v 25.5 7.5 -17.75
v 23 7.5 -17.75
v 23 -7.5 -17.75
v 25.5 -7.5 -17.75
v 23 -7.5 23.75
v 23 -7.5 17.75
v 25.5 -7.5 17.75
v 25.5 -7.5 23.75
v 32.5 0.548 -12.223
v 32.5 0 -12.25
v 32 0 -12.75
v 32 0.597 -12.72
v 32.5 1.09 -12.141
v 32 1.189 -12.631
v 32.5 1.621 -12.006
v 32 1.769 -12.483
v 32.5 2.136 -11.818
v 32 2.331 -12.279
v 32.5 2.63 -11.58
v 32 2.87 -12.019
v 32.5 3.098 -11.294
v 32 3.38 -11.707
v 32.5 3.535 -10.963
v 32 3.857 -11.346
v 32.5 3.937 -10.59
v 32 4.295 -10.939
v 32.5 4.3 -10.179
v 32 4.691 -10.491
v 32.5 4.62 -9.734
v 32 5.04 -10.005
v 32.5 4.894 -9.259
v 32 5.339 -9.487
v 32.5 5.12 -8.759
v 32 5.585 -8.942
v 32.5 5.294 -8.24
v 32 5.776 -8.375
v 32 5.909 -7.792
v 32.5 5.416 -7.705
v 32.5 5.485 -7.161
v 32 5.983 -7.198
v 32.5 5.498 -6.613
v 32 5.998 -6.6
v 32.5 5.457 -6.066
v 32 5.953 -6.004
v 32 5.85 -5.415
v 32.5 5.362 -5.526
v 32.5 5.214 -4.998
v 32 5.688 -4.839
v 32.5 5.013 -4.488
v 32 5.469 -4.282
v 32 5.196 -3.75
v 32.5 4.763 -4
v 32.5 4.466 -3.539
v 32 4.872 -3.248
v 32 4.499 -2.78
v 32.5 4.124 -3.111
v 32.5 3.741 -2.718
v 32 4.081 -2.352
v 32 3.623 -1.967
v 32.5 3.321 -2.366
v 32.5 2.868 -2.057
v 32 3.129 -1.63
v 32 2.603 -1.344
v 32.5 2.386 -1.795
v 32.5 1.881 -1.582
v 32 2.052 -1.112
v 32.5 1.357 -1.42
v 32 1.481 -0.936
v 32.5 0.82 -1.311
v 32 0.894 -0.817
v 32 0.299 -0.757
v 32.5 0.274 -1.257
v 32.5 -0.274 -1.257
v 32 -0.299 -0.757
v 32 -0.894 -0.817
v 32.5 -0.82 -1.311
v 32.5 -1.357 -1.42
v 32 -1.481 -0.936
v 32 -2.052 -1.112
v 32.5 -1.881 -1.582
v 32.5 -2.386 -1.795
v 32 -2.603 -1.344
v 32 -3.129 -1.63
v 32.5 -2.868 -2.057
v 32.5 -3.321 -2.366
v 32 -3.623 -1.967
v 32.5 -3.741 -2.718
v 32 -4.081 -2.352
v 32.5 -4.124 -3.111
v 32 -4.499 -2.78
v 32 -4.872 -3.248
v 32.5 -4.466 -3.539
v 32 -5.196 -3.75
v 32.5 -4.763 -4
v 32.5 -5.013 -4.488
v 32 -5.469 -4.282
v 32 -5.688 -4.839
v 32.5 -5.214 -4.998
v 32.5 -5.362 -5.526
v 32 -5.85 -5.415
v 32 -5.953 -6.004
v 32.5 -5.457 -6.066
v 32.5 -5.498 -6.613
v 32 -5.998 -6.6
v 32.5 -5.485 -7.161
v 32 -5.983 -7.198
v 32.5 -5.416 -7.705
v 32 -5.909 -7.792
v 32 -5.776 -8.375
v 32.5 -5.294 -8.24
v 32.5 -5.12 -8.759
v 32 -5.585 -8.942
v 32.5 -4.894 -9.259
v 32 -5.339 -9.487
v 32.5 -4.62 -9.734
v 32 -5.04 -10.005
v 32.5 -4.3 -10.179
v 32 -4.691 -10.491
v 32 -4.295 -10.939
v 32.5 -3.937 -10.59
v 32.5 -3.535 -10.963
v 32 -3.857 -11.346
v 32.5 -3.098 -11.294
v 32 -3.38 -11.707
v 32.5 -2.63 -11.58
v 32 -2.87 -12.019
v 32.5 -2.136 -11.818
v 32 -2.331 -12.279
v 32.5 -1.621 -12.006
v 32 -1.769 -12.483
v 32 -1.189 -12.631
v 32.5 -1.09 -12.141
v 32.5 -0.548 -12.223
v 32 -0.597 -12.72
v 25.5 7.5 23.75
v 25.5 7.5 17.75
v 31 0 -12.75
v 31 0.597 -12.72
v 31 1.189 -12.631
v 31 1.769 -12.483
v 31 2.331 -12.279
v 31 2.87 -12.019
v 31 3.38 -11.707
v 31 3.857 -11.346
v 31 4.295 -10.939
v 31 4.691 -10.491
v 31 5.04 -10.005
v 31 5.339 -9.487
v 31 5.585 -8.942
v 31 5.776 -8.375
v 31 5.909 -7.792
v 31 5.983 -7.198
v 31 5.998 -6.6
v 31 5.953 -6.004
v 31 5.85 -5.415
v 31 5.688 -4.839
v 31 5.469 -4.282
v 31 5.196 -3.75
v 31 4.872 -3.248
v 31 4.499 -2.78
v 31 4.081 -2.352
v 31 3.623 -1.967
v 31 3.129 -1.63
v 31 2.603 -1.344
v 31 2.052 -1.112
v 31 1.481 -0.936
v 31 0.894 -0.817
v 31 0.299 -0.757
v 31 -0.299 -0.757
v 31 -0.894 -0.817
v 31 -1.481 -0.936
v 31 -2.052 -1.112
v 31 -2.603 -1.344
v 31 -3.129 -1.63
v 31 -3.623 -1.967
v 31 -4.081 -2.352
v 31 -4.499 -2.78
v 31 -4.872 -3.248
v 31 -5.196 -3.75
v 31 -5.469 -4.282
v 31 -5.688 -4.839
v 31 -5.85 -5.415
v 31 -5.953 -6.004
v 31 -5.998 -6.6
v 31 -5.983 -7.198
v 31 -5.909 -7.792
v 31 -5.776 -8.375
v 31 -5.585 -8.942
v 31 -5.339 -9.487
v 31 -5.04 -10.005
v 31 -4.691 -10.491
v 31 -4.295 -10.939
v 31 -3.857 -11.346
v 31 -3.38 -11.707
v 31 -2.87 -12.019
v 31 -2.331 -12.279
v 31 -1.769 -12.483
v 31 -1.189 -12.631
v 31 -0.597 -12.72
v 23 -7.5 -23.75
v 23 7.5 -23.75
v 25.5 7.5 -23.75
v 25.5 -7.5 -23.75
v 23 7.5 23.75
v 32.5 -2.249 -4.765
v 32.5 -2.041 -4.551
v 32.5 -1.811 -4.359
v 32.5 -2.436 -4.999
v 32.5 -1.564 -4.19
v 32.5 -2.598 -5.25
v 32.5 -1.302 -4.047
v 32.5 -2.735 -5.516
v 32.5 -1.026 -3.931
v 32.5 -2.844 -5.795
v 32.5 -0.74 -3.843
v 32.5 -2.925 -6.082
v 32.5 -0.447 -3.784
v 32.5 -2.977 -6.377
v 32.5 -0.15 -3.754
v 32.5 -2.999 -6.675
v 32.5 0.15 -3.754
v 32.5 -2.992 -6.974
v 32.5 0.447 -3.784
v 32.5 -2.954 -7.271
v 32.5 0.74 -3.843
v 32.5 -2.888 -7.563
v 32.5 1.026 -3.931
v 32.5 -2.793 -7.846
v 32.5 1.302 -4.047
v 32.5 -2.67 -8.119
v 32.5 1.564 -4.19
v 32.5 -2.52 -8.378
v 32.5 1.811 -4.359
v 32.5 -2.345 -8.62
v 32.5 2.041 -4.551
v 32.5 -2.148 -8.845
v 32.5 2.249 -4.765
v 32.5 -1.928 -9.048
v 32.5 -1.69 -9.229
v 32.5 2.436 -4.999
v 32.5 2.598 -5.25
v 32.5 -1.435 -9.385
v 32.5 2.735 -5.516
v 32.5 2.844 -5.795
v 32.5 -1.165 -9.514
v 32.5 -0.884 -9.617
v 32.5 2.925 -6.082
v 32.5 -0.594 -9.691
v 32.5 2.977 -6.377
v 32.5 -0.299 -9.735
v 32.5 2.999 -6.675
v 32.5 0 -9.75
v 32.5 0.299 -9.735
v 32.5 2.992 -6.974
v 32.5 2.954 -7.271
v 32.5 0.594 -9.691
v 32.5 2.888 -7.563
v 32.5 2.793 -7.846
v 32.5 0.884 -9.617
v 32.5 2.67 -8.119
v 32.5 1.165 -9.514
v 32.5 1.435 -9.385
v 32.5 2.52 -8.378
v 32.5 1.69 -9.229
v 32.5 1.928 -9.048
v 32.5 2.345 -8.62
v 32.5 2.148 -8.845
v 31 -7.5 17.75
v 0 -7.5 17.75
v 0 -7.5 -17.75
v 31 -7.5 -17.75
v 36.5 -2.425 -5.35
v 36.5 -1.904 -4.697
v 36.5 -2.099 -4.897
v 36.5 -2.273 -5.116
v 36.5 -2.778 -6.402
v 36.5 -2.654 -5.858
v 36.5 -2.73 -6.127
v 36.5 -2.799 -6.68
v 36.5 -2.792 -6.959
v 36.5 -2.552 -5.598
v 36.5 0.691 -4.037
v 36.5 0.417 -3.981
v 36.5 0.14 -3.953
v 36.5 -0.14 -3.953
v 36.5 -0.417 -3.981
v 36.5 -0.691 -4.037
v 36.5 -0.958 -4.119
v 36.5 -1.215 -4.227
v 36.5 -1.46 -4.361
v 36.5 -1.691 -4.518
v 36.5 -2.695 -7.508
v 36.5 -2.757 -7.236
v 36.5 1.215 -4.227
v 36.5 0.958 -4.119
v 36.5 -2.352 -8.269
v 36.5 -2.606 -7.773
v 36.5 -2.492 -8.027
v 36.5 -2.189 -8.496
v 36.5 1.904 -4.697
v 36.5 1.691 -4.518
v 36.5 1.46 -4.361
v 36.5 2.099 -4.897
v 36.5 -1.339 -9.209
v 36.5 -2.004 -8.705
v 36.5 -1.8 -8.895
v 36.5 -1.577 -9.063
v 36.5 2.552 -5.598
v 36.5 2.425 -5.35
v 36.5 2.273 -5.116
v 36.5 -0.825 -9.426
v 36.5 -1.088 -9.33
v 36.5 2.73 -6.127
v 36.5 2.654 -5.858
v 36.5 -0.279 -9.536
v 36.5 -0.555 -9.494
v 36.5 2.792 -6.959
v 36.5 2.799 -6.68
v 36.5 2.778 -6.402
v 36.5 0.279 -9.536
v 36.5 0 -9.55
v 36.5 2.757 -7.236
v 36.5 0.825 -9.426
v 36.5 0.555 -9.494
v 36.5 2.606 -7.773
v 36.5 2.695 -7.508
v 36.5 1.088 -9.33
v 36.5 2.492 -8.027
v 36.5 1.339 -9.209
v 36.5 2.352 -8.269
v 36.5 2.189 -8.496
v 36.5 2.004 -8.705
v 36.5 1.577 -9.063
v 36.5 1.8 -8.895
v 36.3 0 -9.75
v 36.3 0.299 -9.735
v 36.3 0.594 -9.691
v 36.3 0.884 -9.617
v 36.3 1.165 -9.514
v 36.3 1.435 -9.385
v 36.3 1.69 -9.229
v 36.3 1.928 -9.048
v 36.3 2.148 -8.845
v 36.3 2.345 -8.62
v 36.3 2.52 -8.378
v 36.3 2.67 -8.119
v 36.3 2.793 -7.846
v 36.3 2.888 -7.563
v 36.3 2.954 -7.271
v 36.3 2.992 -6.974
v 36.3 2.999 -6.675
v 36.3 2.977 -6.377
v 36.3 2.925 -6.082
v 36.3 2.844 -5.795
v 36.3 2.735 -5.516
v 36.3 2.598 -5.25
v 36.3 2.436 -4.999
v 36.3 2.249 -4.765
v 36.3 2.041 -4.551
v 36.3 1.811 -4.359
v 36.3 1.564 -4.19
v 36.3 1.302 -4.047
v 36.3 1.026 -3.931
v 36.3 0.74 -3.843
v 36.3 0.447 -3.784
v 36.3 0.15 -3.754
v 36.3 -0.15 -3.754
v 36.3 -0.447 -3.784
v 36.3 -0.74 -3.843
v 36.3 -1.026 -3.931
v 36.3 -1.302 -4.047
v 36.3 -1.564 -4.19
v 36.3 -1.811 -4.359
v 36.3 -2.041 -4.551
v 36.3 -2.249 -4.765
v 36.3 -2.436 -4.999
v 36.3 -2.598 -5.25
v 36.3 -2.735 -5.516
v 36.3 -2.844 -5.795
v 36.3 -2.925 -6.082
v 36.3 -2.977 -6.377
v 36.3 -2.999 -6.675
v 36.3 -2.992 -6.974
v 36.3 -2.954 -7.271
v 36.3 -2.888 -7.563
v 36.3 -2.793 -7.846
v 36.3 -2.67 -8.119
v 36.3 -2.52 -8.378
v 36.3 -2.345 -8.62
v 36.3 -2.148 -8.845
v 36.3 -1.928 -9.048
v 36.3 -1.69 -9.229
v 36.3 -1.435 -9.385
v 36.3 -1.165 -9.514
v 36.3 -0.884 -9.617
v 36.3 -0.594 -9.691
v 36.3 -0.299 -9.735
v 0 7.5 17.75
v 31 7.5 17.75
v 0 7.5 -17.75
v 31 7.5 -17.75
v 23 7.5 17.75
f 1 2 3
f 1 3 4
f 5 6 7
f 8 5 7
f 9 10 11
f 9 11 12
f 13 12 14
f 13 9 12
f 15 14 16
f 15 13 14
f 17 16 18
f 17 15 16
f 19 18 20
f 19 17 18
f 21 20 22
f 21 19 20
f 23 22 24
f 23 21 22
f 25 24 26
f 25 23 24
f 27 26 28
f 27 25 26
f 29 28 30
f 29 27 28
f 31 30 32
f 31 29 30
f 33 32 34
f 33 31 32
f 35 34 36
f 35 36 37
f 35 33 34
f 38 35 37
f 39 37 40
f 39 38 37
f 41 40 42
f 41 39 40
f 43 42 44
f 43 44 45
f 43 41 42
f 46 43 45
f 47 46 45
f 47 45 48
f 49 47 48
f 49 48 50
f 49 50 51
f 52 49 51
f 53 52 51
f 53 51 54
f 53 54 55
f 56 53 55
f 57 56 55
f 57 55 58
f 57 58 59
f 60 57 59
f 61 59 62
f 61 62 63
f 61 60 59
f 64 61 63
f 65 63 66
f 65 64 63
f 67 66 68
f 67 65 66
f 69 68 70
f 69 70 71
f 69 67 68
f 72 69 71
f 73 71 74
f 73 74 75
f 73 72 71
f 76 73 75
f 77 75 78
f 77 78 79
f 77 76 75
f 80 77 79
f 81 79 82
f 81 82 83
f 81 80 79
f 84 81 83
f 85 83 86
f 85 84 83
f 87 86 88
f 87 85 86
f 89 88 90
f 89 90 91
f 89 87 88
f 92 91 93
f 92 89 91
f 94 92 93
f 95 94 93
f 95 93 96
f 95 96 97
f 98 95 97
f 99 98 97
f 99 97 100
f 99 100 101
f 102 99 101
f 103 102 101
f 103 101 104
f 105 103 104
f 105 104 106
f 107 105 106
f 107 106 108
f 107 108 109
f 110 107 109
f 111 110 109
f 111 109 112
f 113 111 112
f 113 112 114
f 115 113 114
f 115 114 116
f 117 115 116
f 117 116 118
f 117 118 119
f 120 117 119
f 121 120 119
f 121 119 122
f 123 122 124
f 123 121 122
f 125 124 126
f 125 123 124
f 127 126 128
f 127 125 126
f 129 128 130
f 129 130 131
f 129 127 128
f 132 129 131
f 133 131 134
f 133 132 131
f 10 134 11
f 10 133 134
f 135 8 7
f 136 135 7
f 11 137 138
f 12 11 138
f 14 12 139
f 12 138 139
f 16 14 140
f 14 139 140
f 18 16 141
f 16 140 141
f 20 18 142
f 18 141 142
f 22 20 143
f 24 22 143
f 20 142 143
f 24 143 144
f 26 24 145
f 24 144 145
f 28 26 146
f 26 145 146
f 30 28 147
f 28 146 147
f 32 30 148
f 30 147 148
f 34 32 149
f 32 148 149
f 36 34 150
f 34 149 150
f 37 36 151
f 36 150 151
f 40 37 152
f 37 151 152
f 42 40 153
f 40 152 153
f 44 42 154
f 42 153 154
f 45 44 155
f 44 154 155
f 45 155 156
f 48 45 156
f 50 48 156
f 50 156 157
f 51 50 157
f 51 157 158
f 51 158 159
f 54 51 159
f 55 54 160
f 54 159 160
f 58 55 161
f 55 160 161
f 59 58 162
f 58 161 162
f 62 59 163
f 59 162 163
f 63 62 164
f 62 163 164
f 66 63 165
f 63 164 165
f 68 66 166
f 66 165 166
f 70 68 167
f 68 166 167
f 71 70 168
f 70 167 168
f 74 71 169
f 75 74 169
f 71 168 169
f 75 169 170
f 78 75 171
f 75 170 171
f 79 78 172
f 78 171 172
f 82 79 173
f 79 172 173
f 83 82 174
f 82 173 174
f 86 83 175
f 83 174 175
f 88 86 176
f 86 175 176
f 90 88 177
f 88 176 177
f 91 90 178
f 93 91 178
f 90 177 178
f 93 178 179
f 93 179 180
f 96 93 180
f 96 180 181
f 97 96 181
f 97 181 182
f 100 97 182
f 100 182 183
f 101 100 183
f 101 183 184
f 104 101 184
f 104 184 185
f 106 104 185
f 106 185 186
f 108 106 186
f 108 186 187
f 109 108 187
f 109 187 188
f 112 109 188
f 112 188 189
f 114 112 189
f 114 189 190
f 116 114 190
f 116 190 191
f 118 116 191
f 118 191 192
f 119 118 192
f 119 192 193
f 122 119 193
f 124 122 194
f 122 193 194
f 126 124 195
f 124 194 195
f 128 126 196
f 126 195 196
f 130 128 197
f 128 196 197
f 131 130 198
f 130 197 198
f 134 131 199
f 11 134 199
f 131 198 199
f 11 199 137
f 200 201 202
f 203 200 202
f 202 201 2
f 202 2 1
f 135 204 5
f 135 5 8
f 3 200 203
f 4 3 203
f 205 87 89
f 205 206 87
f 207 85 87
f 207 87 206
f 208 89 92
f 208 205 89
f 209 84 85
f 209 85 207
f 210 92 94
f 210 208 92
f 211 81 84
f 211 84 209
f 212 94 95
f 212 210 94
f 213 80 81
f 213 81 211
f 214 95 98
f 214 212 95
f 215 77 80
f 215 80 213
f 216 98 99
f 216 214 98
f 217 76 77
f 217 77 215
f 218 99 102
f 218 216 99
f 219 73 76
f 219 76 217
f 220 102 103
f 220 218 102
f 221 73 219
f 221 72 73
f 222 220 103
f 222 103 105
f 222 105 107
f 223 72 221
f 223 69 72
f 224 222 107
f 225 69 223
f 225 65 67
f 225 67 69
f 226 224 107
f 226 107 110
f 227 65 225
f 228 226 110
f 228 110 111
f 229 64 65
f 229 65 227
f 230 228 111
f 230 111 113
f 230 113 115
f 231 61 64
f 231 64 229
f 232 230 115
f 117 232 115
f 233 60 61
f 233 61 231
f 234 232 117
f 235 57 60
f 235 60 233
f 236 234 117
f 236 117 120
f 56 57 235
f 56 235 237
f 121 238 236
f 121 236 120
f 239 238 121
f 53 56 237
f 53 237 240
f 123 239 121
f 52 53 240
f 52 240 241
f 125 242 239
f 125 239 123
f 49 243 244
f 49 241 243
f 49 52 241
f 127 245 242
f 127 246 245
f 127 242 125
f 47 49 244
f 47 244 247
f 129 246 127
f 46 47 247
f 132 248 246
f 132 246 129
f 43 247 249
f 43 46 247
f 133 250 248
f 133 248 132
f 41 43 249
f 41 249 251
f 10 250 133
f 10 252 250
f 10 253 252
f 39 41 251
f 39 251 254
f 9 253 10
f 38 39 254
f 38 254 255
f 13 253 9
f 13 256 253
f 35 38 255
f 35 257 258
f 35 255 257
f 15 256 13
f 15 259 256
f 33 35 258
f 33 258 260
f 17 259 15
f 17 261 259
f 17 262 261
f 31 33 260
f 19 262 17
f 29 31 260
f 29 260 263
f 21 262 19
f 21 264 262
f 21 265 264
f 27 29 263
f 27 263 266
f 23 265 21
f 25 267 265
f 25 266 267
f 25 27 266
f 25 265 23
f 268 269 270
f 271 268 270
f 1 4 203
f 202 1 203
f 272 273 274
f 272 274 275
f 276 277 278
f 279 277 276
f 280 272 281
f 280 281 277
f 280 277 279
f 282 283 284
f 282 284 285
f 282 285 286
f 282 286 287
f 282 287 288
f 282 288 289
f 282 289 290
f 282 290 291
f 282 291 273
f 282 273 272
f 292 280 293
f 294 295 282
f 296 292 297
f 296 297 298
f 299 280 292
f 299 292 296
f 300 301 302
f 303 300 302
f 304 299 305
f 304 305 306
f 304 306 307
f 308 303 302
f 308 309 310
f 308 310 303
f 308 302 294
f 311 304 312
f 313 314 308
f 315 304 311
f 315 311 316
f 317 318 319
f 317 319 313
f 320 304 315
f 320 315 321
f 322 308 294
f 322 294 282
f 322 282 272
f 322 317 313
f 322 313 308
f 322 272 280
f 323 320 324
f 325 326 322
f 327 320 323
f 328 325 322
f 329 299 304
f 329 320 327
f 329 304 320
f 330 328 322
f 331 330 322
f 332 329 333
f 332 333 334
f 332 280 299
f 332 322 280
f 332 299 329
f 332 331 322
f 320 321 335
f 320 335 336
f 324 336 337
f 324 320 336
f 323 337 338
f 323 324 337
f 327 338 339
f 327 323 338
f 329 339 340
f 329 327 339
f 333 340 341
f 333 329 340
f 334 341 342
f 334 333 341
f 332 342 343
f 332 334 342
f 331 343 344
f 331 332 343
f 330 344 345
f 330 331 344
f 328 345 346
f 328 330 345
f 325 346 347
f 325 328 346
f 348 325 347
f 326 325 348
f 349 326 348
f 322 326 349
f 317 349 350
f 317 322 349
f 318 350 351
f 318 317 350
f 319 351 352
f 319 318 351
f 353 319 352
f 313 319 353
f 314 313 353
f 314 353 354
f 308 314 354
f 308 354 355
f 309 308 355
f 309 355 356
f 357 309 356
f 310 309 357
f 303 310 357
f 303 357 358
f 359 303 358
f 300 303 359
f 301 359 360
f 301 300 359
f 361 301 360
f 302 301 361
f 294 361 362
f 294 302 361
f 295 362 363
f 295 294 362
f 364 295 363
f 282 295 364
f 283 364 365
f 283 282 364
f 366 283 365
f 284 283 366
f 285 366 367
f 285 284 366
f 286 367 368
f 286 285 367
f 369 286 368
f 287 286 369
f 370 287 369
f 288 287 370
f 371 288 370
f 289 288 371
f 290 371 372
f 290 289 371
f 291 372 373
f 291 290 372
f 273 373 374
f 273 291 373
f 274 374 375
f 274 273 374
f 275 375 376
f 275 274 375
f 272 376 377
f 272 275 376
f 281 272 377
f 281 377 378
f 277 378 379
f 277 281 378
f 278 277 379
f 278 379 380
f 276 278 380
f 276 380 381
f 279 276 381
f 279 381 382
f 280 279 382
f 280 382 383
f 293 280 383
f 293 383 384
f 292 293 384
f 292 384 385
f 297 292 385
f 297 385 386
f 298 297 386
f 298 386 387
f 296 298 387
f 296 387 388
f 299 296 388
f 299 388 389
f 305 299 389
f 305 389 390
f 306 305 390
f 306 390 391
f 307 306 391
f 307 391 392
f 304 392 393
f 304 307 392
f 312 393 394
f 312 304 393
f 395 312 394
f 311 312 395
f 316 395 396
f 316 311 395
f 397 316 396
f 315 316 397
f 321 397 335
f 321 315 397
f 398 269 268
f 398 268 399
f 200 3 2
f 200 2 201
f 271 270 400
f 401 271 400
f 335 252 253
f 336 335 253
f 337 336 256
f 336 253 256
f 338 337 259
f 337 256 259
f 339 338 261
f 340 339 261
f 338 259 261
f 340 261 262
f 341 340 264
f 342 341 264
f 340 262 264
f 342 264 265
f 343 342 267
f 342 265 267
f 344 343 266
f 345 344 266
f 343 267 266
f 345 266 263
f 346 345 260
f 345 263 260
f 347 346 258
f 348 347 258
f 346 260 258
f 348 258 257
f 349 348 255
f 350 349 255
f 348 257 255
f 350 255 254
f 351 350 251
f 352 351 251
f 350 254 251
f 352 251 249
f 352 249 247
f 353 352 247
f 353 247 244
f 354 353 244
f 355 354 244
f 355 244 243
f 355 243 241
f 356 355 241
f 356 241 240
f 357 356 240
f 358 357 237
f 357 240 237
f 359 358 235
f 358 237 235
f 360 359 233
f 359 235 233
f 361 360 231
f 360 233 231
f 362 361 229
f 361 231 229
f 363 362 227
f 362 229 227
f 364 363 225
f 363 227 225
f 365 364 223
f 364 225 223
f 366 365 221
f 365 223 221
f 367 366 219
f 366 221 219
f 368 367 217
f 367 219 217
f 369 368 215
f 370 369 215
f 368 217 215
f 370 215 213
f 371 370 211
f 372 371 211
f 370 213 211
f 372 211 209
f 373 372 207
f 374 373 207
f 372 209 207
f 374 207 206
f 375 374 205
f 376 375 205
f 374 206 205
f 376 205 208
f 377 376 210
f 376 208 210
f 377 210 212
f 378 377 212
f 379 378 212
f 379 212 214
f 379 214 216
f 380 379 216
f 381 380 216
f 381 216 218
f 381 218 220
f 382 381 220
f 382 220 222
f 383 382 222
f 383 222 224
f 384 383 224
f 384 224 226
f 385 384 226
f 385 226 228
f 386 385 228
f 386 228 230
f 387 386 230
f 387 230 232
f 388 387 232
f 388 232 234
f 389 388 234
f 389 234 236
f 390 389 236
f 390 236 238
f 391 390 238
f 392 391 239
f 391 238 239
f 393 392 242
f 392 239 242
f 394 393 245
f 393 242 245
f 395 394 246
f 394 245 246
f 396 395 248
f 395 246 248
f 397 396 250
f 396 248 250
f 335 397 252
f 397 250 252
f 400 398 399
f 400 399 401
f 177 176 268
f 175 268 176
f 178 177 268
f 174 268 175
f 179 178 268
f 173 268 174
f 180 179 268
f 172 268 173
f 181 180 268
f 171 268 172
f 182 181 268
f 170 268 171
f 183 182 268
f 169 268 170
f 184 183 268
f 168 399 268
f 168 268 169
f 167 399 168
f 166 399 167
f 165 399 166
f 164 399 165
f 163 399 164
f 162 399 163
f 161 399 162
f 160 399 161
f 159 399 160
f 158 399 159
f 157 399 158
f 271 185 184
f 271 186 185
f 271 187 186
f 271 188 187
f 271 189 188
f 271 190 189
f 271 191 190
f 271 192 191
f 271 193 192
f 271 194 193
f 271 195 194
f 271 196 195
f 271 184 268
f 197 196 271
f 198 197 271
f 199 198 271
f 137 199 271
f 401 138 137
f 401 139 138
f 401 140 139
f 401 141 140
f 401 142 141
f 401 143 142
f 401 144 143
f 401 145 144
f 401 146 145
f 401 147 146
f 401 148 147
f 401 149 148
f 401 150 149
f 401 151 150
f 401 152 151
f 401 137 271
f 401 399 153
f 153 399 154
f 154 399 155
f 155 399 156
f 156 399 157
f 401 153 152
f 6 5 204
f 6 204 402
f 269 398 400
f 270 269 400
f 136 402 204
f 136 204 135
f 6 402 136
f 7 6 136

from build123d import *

# Parameters (mm, degrees)
SKETCH_2_W        = 35.5
SKETCH_2_H        = 15
EXTRUDE_1_DEPTH   = 31
SKETCH_3_W        = 2.5
SKETCH_3_H        = 6
EXTRUDE_2_DEPTH   = 15
EXTRUDE_2_2_DEPTH = 15
SKETCH_4_R        = 6
EXTRUDE_3_DEPTH   = 1.5
CHAMFER_1_SIZE    = 0.5
SKETCH_5_R        = 3
EXTRUDE_4_DEPTH   = 4
CHAMFER_2_SIZE    = 0.2


with BuildPart() as part:
    # 草图2 → 凸台-拉伸1 (new body)
    with BuildSketch(Plane(origin=(0, 0, 0), x_dir=(0, 0, -1), z_dir=(1, 0, 0))):
        Rectangle(SKETCH_2_W, SKETCH_2_H)
    extrude(amount=EXTRUDE_1_DEPTH)

    # 草图4 → 凸台-拉伸3 (add)
    with BuildSketch(Plane(origin=(31, 0, 0), x_dir=(0, 0, -1), z_dir=(1, 0, 0))):
        with Locations((6.75, 0)):
            Circle(SKETCH_4_R)
    extrude(amount=EXTRUDE_3_DEPTH)

    # 倒角1
    chamfer_1_edges = [part.edges().sort_by_distance(p)[0] for p in [
        (32.5, 0, -0.75),
    ]]
    chamfer(chamfer_1_edges, length=CHAMFER_1_SIZE)

    # 草图5 → 凸台-拉伸4 (add)
    with BuildSketch(Plane(origin=(32.5, 0, 0), x_dir=(0, 0, -1), z_dir=(1, 0, 0))):
        with Locations((6.75, 0)):
            Circle(SKETCH_5_R)
    extrude(amount=EXTRUDE_4_DEPTH)

    # 倒角2
    chamfer_2_edges = [part.edges().sort_by_distance(p)[0] for p in [
        (36.5, 0, -3.75),
    ]]
    chamfer(chamfer_2_edges, length=CHAMFER_2_SIZE)


with BuildPart() as body_2:
    # 草图3 → 凸台-拉伸2 (new body)
    with BuildSketch(Plane(origin=(0, 7.5, 0), x_dir=(1, 0, 0), z_dir=(0, 1, 0))):
        with Locations((24.25, 20.75)):
            Rectangle(SKETCH_3_W, SKETCH_3_H)
    extrude(amount=-EXTRUDE_2_DEPTH)


with BuildPart() as body_3:
    # 草图3 → Extrude 2 2 (new body)
    with BuildSketch(Plane(origin=(0, 7.5, 0), x_dir=(1, 0, 0), z_dir=(0, 1, 0))):
        with Locations((24.25, -20.75)):
            Rectangle(SKETCH_3_W, SKETCH_3_H)
    extrude(amount=-EXTRUDE_2_2_DEPTH)


solid = Compound([part.part, body_2.part, body_3.part])
